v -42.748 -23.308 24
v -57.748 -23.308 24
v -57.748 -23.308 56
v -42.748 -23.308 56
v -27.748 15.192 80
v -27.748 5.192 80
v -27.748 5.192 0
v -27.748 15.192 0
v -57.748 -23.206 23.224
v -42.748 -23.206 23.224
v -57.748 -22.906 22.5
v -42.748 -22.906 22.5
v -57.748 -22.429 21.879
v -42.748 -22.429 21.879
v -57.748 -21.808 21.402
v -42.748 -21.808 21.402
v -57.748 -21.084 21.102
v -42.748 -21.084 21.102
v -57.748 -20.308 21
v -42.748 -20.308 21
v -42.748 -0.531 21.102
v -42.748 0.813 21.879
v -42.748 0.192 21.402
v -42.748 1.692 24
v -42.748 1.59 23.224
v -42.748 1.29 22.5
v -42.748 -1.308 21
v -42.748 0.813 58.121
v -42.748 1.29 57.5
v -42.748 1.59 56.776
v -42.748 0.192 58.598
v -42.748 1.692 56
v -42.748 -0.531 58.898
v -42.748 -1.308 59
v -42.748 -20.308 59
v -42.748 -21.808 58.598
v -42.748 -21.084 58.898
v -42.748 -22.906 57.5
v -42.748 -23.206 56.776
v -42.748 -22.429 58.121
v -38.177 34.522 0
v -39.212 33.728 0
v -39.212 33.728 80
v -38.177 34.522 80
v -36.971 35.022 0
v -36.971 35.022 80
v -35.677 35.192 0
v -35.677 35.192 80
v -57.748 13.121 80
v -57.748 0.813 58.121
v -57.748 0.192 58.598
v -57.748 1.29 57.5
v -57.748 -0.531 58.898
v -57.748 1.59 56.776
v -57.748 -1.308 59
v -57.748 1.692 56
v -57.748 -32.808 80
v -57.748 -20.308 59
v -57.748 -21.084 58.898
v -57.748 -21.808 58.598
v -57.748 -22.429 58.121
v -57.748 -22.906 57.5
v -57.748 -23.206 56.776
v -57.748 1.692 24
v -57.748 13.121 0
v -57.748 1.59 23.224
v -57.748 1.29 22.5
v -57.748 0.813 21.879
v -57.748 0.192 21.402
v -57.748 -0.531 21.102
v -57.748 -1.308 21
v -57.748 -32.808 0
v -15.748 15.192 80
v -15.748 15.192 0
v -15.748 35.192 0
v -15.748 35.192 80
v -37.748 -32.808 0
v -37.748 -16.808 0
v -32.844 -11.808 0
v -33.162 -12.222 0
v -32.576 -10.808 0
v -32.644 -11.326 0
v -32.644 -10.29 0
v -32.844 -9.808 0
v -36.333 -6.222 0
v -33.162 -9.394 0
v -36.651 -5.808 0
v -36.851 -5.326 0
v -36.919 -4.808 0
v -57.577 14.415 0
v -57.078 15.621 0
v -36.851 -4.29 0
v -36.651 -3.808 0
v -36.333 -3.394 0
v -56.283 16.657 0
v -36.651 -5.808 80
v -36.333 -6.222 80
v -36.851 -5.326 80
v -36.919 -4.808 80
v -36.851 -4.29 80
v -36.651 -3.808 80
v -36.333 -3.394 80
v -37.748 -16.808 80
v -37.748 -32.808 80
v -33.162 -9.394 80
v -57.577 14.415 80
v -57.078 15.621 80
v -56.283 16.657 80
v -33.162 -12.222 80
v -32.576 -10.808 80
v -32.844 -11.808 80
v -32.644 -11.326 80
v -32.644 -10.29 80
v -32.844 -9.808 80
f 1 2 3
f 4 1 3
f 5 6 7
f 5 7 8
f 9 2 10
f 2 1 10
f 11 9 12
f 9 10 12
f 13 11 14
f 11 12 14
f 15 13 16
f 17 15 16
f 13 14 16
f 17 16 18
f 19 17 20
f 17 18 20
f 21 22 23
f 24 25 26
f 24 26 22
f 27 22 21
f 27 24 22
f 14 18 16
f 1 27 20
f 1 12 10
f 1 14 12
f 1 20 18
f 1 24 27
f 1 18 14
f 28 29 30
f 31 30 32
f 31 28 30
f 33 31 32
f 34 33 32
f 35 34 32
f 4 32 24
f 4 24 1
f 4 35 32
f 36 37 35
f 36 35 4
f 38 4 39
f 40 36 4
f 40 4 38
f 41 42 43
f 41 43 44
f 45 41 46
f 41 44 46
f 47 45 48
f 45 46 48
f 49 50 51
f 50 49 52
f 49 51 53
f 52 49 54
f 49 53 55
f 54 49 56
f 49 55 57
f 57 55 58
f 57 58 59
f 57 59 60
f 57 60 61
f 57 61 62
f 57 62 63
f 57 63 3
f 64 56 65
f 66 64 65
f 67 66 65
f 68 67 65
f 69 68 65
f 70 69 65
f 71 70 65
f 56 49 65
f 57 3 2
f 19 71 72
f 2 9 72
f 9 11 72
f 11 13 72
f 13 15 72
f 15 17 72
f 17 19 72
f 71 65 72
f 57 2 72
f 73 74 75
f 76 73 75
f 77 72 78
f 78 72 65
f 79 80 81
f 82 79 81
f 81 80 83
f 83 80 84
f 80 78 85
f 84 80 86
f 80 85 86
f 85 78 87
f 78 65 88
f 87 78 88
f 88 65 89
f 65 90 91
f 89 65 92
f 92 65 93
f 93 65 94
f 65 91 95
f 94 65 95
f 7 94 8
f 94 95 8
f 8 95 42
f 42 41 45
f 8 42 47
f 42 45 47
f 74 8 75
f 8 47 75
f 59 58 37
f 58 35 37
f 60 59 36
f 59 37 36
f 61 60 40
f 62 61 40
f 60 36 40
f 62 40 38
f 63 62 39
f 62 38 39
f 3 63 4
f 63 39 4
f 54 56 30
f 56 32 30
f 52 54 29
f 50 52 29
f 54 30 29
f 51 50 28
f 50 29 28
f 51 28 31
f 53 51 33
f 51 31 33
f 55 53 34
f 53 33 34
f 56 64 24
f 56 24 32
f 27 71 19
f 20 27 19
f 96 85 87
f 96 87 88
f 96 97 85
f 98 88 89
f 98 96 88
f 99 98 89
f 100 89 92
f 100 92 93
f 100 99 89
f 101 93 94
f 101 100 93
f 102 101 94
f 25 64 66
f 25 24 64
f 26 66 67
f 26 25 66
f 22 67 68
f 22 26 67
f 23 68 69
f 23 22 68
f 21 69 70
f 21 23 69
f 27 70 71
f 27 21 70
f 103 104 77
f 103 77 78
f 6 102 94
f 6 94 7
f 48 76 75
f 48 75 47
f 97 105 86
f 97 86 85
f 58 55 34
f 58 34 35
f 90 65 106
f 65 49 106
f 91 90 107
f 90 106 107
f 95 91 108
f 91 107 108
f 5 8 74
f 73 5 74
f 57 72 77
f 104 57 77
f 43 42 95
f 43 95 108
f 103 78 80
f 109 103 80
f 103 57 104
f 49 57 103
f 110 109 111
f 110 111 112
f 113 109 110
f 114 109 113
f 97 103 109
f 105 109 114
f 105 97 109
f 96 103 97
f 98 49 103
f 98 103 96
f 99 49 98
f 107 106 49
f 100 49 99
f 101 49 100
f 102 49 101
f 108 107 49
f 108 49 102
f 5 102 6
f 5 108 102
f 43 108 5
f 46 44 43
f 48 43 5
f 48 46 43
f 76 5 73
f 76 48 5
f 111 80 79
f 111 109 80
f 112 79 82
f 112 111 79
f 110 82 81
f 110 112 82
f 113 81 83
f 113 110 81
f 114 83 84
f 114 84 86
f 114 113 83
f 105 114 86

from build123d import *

# Parameters (mm, degrees)
F0_W     = 10
F0_H     = 10
F1_DEPTH = 80
F2_R     = 2
F3_R     = 2
F4_SIZE  = 20
F5_W     = 25
F5_H     = 38
F6_DEPTH = 15
F7_R     = 3
F8_R     = 5


with BuildPart() as f1:
    # F0 (on Top) → F1 (new body)
    with BuildSketch(Plane.XY):
        Polygon((-57.7475710213, 35.1921368795), (-57.7475710213, 15.1921368795), (-37.7475710213, 15.1921368795), (-27.7475710213, 15.1921368795), (-15.7475710213, 15.1921368795), (-15.7475710213, 35.1921368795), align=None)
        Polygon((-37.7475710213, 15.1921368795), (-57.7475710213, 15.1921368795), (-57.7475710213, -32.8078631205), (-37.7475710213, -32.8078631205), (-37.7475710213, -16.8078631205), (-37.7475710213, -4.8078631205), (-37.7475710213, 5.1921368795), align=None)
        with Locations((-32.7475710213, 10.1921368795)):
            Rectangle(F0_W, F0_H)
        Polygon((-27.7475710213, 5.1921368795), (-37.7475710213, 5.1921368795), (-37.7475710213, -4.8078631205), align=None)
        Polygon((-31.7475710213, -10.8078631205), (-37.7475710213, -4.8078631205), (-37.7475710213, -16.8078631205), align=None)
    extrude(amount=F1_DEPTH)

    # F2
    f2_edges = [f1.edges().sort_by_distance(p)[0] for p in [
        (-31.747571, -10.807863, 40),
    ]]
    fillet(f2_edges, radius=F2_R)

    # F3
    f3_edges = [f1.edges().sort_by_distance(p)[0] for p in [
        (-37.747571, -4.807863, 40),
    ]]
    fillet(f3_edges, radius=F3_R)

    # F4
    f4_edges = [f1.edges().sort_by_distance(p)[0] for p in [
        (-57.747571, 35.192137, 40),
    ]]
    chamfer(f4_edges, length=F4_SIZE)

    # F5 (on face) → F6 (cut)
    with BuildSketch(Plane(origin=(-57.7475710213, 0, 0), x_dir=(0, -1, 0), z_dir=(-1, 0, 0))):
        with Locations((10.8078631205, 40)):
            Rectangle(F5_W, F5_H)
    extrude(amount=-F6_DEPTH, mode=Mode.SUBTRACT)

    # F7
    f7_edges = [f1.edges().sort_by_distance(p)[0] for p in [
        (-50.247571, 1.692137, 21),
        (-50.247571, 1.692137, 59),
        (-50.247571, -23.307863, 59),
        (-50.247571, -23.307863, 21),
    ]]
    fillet(f7_edges, radius=F7_R)

    # F8
    f8_edges = [f1.edges().sort_by_distance(p)[0] for p in [
        (-37.747571, 35.192137, 40),
        (-57.747571, 15.192137, 40),
    ]]
    fillet(f8_edges, radius=F8_R)


solid = f1.part
